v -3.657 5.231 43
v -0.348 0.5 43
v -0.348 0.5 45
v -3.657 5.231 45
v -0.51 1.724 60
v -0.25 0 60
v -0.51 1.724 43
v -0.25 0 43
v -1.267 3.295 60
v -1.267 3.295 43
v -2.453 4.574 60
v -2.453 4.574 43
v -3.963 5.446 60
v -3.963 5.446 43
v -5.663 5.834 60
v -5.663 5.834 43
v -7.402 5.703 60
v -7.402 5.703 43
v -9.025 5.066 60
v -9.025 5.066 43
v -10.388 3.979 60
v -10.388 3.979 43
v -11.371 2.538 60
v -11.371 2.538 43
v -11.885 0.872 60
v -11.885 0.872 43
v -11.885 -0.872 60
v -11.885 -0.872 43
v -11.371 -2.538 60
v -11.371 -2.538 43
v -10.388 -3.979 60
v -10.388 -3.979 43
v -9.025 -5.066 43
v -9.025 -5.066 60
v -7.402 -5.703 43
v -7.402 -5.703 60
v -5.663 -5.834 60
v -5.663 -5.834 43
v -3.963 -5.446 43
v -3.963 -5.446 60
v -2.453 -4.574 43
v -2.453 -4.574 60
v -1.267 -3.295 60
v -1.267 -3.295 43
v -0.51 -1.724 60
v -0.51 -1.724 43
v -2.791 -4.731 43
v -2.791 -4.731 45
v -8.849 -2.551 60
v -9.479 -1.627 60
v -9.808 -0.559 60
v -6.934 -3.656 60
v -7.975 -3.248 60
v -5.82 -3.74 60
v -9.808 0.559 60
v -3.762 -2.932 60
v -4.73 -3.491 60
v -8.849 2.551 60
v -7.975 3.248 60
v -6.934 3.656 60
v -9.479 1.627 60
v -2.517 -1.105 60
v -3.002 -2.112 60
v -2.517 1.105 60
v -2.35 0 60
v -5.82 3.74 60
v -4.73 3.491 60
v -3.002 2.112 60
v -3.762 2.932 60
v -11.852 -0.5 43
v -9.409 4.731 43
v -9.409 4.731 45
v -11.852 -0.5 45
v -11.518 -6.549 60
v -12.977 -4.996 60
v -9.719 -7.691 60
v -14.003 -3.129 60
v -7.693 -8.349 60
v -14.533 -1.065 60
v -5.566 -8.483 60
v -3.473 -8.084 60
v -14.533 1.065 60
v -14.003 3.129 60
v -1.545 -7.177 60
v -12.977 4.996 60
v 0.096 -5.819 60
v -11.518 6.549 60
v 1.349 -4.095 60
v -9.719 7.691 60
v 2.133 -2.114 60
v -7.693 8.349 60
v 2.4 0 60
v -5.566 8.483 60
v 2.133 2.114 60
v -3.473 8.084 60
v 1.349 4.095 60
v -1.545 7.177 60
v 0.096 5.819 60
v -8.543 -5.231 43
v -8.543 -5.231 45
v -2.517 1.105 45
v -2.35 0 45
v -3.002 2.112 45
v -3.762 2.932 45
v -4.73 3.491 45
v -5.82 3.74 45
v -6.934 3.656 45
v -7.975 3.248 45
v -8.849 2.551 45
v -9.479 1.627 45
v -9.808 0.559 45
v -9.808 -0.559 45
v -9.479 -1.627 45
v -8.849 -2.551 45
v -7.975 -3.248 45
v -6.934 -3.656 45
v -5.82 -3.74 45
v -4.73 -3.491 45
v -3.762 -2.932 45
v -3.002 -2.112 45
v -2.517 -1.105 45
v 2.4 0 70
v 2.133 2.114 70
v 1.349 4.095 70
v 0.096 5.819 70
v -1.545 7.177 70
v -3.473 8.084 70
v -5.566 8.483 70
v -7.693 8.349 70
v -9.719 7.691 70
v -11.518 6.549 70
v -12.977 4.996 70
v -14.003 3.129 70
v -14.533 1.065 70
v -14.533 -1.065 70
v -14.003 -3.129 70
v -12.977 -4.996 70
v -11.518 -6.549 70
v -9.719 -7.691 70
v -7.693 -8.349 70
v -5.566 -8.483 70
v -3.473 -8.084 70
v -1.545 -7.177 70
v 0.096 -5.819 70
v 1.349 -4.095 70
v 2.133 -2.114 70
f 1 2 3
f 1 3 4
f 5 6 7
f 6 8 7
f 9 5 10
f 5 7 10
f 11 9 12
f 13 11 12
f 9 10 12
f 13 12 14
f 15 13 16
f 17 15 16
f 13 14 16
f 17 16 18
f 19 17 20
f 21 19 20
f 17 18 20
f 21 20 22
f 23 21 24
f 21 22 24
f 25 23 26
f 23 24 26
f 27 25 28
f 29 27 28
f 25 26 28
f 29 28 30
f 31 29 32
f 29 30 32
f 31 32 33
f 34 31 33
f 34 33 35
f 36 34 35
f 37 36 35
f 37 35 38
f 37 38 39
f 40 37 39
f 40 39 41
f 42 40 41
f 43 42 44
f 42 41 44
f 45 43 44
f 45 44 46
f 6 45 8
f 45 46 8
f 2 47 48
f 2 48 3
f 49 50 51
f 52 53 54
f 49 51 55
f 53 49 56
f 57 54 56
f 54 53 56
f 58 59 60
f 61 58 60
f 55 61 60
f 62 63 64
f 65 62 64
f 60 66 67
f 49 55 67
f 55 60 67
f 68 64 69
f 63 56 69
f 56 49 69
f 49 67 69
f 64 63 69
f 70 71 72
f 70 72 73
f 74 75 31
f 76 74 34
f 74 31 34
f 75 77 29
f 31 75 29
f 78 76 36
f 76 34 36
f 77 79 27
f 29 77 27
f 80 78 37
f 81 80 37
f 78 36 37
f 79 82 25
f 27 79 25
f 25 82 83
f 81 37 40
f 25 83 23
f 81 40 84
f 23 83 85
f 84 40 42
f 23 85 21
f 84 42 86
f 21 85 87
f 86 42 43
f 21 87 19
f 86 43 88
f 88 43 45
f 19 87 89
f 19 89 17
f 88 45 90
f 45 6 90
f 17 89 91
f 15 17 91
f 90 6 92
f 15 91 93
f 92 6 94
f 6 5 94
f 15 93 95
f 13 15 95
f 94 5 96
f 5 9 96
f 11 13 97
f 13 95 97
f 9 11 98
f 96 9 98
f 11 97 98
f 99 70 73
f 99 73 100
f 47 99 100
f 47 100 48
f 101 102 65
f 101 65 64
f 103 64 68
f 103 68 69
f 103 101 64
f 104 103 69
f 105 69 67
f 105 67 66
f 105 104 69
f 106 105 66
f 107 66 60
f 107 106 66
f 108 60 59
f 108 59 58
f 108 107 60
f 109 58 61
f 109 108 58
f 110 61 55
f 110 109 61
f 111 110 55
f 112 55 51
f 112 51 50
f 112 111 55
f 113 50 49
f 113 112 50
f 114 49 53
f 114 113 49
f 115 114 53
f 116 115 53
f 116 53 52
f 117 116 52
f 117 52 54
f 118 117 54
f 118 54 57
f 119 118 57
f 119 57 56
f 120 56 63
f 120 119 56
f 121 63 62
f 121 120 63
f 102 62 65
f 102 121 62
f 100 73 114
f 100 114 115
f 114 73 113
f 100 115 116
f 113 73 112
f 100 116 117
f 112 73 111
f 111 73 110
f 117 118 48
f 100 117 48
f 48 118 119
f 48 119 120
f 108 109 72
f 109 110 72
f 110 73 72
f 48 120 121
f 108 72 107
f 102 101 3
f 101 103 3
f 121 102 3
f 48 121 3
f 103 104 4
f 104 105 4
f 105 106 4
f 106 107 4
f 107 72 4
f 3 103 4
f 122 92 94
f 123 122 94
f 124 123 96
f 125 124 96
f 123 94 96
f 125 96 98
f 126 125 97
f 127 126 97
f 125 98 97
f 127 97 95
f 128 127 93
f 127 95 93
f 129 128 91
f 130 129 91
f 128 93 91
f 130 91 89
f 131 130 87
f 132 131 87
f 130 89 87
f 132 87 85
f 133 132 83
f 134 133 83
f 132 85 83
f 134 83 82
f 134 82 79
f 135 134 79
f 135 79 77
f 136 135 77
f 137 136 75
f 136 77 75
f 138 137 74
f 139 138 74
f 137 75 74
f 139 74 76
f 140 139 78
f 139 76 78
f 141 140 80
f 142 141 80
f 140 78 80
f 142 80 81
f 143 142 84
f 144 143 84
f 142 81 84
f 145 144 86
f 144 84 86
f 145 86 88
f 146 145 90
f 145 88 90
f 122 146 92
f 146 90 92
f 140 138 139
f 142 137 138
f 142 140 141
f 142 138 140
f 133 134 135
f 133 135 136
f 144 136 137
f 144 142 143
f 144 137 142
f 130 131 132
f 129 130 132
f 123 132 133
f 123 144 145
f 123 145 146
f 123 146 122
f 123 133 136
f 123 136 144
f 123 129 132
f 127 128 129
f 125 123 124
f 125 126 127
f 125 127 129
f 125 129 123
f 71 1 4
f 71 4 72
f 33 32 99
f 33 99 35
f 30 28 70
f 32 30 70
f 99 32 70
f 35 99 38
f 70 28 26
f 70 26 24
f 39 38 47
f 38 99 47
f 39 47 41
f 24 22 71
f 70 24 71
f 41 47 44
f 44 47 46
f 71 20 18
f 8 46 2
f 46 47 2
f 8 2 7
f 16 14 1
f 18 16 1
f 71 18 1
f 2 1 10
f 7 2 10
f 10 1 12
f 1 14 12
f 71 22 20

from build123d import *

# Parameters (mm, degrees)
SKETCH136_R   = 5.85
PAD069_DEPTH  = 2
SKETCH095_R   = 5.85
SKETCH095_R_2 = 3.75
PAD070_DEPTH  = 15
SKETCH096_R   = 8.5
PAD071_DEPTH  = 10


with BuildPart() as part:
    # Sketch136 → Pad069 (new body)
    with BuildSketch(Plane.XY):
        with Locations((-1.1, 0.5)):
            Circle(SKETCH136_R)
        Polygon((-4.408918, 5.231215), (-6.851811, 0), (-3.542893, -4.731215), (2.208918, -4.231215), (4.651811, 1), (1.342893, 5.731215), align=None, mode=Mode.SUBTRACT)
    extrude(amount=PAD069_DEPTH)

    # Sketch095 (on Face9 of Pad069) → Pad070 (join)
    with BuildSketch(Plane.XY.offset(2)):
        with Locations((-1.1, 0.5)):
            Circle(SKETCH095_R)
        with Locations((-1.1, 0.5)):
            Circle(SKETCH095_R_2, mode=Mode.SUBTRACT)
    extrude(amount=PAD070_DEPTH)

    # Sketch096 (on Face10 of Pad070) → Pad071 (join)
    with BuildSketch(Plane.XY.offset(17)):
        with Locations((-1.1, 0.5)):
            Circle(SKETCH096_R)
    extrude(amount=PAD071_DEPTH)


with BuildPart() as part_1:
    # Body010 placement: moved
    add(part.part.moved(Location((-5, -0.5, 43))))


solid = part_1.part
